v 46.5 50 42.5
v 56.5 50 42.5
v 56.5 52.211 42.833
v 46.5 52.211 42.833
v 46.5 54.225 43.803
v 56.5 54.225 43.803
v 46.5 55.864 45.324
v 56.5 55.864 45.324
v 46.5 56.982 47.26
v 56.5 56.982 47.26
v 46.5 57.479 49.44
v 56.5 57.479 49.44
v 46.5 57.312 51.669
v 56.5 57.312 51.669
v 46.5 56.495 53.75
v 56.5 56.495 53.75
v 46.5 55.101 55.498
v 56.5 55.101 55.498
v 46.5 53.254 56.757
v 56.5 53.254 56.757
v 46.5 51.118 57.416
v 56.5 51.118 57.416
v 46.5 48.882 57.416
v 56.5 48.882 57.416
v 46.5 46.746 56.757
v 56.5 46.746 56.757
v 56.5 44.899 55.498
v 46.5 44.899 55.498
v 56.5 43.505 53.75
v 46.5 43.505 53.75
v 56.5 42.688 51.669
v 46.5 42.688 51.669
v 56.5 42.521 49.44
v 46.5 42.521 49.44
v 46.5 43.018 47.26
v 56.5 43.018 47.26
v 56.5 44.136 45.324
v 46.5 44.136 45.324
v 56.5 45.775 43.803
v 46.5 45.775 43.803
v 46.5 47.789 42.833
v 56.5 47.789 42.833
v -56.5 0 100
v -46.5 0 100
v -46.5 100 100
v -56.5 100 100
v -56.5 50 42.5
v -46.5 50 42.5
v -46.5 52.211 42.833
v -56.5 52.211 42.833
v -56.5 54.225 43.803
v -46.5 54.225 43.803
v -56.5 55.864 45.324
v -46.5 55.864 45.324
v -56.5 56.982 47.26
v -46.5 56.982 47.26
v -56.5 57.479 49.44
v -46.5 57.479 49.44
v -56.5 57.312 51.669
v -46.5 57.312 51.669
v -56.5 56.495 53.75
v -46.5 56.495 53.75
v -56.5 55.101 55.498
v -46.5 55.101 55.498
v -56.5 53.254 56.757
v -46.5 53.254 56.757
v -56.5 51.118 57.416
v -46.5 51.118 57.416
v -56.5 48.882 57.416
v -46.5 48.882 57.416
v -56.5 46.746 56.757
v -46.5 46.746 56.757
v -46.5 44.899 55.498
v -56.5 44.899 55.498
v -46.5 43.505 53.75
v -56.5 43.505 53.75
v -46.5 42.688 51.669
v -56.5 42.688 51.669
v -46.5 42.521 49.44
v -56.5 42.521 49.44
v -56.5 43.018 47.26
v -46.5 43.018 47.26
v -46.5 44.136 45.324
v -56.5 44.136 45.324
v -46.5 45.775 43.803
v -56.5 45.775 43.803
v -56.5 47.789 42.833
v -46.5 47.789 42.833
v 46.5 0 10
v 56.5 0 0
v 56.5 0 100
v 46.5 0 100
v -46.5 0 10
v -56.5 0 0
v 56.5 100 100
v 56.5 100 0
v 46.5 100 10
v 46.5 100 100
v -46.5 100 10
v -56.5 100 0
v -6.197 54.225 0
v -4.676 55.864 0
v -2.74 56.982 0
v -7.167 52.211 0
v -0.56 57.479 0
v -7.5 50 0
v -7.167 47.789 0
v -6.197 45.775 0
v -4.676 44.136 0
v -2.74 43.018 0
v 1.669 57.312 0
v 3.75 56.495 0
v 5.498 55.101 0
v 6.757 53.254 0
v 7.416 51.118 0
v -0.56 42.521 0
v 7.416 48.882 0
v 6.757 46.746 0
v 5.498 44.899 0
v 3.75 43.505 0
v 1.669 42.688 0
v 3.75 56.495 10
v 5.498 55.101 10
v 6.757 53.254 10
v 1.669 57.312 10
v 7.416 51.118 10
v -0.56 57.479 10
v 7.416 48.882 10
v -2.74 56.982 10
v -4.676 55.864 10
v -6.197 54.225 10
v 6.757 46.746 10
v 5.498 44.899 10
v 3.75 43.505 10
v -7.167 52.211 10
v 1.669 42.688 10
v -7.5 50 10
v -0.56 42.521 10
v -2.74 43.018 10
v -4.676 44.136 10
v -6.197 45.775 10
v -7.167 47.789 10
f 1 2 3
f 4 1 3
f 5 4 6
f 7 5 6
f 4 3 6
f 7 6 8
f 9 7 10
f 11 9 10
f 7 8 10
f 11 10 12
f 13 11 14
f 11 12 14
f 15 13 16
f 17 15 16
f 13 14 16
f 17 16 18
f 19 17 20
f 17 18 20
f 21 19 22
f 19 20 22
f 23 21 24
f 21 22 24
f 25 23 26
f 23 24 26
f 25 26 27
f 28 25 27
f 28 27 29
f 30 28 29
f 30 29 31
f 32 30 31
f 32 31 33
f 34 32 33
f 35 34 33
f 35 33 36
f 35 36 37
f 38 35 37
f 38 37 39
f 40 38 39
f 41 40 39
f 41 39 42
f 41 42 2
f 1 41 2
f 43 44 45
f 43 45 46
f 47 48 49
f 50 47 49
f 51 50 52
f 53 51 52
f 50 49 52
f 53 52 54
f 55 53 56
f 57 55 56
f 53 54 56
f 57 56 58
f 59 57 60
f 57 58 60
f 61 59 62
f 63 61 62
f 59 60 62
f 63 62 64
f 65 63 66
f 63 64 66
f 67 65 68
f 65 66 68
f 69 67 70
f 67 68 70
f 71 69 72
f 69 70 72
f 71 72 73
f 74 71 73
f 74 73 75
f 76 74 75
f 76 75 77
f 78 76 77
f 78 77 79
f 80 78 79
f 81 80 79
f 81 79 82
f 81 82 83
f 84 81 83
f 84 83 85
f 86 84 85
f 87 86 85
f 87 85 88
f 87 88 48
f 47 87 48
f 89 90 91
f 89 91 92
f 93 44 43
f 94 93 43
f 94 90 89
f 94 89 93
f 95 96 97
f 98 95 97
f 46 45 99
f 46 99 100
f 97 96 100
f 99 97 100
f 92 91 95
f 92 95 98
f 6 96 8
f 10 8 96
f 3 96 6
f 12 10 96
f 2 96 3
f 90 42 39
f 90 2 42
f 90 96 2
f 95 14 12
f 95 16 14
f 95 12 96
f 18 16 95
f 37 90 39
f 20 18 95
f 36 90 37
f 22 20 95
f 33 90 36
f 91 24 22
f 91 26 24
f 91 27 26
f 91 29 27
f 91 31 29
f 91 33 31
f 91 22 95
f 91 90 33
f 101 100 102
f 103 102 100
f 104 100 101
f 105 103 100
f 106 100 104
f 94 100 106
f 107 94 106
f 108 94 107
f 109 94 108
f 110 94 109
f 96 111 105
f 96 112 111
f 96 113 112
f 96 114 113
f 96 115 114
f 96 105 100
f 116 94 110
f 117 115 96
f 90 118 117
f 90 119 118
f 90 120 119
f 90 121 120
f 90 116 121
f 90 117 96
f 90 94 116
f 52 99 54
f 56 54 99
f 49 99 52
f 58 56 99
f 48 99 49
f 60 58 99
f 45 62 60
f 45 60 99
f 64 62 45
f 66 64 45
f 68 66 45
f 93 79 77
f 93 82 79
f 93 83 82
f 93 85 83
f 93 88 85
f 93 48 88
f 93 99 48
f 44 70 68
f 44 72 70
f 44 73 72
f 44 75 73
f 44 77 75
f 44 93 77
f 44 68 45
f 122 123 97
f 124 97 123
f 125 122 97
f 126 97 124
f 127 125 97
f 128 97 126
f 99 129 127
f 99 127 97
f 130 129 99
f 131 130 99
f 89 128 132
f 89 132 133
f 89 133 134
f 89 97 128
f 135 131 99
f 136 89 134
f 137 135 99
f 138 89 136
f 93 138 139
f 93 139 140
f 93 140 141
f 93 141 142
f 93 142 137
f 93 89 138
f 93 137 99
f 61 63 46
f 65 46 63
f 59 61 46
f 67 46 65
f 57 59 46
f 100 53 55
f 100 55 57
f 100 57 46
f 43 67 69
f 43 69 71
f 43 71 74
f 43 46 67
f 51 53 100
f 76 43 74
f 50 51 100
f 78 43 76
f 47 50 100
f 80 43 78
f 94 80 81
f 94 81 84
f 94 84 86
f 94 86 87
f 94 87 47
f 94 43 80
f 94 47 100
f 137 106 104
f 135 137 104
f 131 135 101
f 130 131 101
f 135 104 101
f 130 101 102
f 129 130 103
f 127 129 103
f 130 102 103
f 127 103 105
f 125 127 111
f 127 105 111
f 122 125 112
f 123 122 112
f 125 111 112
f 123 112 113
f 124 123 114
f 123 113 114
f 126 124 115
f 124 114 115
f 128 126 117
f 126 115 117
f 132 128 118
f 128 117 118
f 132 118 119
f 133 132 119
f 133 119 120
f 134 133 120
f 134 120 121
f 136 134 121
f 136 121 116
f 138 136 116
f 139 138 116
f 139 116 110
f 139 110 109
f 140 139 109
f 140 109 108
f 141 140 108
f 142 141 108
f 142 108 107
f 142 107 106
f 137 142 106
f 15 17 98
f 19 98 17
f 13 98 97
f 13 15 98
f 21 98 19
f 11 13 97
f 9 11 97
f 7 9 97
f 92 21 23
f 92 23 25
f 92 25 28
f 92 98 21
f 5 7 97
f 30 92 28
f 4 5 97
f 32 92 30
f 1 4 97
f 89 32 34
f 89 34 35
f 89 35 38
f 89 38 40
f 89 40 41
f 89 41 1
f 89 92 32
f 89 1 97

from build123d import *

# Parameters (mm, degrees)
BOSS_EXTRUDE1_DEPTH = 100
SKETCH2_R           = 7.5
CUT_EXTRUDE1_DEPTH  = 140
SKETCH3_R           = 7.5
CUT_EXTRUDE2_DEPTH  = 140


with BuildPart() as part:
    # Sketch1 → Boss-Extrude1 (new body)
    with BuildSketch(Plane(origin=(0, 0, 0), x_dir=(1, 0, 0), z_dir=(0, 1, 0))):
        Polygon((-56.5, 0), (56.5, 0), (56.5, -100), (46.5, -100), (46.5, -10), (-46.5, -10), (-46.5, -100), (-56.5, -100), align=None)
    extrude(amount=BOSS_EXTRUDE1_DEPTH)

    # Sketch2 → Cut-Extrude1 (cut)
    with BuildSketch(Plane(origin=(56.5, 0, 0), x_dir=(0, 0, -1), z_dir=(1, 0, 0))):
        with Locations((-50, 50)):
            Circle(SKETCH2_R)
    extrude(amount=-CUT_EXTRUDE1_DEPTH, mode=Mode.SUBTRACT)

    # Sketch3 → Cut-Extrude2 (cut)
    with BuildSketch(Plane(origin=(0, 0, 0), x_dir=(-1, 0, 0), z_dir=(0, 0, -1))):
        with Locations((0, 50)):
            Circle(SKETCH3_R)
    extrude(amount=-CUT_EXTRUDE2_DEPTH, mode=Mode.SUBTRACT)


solid = part.part
